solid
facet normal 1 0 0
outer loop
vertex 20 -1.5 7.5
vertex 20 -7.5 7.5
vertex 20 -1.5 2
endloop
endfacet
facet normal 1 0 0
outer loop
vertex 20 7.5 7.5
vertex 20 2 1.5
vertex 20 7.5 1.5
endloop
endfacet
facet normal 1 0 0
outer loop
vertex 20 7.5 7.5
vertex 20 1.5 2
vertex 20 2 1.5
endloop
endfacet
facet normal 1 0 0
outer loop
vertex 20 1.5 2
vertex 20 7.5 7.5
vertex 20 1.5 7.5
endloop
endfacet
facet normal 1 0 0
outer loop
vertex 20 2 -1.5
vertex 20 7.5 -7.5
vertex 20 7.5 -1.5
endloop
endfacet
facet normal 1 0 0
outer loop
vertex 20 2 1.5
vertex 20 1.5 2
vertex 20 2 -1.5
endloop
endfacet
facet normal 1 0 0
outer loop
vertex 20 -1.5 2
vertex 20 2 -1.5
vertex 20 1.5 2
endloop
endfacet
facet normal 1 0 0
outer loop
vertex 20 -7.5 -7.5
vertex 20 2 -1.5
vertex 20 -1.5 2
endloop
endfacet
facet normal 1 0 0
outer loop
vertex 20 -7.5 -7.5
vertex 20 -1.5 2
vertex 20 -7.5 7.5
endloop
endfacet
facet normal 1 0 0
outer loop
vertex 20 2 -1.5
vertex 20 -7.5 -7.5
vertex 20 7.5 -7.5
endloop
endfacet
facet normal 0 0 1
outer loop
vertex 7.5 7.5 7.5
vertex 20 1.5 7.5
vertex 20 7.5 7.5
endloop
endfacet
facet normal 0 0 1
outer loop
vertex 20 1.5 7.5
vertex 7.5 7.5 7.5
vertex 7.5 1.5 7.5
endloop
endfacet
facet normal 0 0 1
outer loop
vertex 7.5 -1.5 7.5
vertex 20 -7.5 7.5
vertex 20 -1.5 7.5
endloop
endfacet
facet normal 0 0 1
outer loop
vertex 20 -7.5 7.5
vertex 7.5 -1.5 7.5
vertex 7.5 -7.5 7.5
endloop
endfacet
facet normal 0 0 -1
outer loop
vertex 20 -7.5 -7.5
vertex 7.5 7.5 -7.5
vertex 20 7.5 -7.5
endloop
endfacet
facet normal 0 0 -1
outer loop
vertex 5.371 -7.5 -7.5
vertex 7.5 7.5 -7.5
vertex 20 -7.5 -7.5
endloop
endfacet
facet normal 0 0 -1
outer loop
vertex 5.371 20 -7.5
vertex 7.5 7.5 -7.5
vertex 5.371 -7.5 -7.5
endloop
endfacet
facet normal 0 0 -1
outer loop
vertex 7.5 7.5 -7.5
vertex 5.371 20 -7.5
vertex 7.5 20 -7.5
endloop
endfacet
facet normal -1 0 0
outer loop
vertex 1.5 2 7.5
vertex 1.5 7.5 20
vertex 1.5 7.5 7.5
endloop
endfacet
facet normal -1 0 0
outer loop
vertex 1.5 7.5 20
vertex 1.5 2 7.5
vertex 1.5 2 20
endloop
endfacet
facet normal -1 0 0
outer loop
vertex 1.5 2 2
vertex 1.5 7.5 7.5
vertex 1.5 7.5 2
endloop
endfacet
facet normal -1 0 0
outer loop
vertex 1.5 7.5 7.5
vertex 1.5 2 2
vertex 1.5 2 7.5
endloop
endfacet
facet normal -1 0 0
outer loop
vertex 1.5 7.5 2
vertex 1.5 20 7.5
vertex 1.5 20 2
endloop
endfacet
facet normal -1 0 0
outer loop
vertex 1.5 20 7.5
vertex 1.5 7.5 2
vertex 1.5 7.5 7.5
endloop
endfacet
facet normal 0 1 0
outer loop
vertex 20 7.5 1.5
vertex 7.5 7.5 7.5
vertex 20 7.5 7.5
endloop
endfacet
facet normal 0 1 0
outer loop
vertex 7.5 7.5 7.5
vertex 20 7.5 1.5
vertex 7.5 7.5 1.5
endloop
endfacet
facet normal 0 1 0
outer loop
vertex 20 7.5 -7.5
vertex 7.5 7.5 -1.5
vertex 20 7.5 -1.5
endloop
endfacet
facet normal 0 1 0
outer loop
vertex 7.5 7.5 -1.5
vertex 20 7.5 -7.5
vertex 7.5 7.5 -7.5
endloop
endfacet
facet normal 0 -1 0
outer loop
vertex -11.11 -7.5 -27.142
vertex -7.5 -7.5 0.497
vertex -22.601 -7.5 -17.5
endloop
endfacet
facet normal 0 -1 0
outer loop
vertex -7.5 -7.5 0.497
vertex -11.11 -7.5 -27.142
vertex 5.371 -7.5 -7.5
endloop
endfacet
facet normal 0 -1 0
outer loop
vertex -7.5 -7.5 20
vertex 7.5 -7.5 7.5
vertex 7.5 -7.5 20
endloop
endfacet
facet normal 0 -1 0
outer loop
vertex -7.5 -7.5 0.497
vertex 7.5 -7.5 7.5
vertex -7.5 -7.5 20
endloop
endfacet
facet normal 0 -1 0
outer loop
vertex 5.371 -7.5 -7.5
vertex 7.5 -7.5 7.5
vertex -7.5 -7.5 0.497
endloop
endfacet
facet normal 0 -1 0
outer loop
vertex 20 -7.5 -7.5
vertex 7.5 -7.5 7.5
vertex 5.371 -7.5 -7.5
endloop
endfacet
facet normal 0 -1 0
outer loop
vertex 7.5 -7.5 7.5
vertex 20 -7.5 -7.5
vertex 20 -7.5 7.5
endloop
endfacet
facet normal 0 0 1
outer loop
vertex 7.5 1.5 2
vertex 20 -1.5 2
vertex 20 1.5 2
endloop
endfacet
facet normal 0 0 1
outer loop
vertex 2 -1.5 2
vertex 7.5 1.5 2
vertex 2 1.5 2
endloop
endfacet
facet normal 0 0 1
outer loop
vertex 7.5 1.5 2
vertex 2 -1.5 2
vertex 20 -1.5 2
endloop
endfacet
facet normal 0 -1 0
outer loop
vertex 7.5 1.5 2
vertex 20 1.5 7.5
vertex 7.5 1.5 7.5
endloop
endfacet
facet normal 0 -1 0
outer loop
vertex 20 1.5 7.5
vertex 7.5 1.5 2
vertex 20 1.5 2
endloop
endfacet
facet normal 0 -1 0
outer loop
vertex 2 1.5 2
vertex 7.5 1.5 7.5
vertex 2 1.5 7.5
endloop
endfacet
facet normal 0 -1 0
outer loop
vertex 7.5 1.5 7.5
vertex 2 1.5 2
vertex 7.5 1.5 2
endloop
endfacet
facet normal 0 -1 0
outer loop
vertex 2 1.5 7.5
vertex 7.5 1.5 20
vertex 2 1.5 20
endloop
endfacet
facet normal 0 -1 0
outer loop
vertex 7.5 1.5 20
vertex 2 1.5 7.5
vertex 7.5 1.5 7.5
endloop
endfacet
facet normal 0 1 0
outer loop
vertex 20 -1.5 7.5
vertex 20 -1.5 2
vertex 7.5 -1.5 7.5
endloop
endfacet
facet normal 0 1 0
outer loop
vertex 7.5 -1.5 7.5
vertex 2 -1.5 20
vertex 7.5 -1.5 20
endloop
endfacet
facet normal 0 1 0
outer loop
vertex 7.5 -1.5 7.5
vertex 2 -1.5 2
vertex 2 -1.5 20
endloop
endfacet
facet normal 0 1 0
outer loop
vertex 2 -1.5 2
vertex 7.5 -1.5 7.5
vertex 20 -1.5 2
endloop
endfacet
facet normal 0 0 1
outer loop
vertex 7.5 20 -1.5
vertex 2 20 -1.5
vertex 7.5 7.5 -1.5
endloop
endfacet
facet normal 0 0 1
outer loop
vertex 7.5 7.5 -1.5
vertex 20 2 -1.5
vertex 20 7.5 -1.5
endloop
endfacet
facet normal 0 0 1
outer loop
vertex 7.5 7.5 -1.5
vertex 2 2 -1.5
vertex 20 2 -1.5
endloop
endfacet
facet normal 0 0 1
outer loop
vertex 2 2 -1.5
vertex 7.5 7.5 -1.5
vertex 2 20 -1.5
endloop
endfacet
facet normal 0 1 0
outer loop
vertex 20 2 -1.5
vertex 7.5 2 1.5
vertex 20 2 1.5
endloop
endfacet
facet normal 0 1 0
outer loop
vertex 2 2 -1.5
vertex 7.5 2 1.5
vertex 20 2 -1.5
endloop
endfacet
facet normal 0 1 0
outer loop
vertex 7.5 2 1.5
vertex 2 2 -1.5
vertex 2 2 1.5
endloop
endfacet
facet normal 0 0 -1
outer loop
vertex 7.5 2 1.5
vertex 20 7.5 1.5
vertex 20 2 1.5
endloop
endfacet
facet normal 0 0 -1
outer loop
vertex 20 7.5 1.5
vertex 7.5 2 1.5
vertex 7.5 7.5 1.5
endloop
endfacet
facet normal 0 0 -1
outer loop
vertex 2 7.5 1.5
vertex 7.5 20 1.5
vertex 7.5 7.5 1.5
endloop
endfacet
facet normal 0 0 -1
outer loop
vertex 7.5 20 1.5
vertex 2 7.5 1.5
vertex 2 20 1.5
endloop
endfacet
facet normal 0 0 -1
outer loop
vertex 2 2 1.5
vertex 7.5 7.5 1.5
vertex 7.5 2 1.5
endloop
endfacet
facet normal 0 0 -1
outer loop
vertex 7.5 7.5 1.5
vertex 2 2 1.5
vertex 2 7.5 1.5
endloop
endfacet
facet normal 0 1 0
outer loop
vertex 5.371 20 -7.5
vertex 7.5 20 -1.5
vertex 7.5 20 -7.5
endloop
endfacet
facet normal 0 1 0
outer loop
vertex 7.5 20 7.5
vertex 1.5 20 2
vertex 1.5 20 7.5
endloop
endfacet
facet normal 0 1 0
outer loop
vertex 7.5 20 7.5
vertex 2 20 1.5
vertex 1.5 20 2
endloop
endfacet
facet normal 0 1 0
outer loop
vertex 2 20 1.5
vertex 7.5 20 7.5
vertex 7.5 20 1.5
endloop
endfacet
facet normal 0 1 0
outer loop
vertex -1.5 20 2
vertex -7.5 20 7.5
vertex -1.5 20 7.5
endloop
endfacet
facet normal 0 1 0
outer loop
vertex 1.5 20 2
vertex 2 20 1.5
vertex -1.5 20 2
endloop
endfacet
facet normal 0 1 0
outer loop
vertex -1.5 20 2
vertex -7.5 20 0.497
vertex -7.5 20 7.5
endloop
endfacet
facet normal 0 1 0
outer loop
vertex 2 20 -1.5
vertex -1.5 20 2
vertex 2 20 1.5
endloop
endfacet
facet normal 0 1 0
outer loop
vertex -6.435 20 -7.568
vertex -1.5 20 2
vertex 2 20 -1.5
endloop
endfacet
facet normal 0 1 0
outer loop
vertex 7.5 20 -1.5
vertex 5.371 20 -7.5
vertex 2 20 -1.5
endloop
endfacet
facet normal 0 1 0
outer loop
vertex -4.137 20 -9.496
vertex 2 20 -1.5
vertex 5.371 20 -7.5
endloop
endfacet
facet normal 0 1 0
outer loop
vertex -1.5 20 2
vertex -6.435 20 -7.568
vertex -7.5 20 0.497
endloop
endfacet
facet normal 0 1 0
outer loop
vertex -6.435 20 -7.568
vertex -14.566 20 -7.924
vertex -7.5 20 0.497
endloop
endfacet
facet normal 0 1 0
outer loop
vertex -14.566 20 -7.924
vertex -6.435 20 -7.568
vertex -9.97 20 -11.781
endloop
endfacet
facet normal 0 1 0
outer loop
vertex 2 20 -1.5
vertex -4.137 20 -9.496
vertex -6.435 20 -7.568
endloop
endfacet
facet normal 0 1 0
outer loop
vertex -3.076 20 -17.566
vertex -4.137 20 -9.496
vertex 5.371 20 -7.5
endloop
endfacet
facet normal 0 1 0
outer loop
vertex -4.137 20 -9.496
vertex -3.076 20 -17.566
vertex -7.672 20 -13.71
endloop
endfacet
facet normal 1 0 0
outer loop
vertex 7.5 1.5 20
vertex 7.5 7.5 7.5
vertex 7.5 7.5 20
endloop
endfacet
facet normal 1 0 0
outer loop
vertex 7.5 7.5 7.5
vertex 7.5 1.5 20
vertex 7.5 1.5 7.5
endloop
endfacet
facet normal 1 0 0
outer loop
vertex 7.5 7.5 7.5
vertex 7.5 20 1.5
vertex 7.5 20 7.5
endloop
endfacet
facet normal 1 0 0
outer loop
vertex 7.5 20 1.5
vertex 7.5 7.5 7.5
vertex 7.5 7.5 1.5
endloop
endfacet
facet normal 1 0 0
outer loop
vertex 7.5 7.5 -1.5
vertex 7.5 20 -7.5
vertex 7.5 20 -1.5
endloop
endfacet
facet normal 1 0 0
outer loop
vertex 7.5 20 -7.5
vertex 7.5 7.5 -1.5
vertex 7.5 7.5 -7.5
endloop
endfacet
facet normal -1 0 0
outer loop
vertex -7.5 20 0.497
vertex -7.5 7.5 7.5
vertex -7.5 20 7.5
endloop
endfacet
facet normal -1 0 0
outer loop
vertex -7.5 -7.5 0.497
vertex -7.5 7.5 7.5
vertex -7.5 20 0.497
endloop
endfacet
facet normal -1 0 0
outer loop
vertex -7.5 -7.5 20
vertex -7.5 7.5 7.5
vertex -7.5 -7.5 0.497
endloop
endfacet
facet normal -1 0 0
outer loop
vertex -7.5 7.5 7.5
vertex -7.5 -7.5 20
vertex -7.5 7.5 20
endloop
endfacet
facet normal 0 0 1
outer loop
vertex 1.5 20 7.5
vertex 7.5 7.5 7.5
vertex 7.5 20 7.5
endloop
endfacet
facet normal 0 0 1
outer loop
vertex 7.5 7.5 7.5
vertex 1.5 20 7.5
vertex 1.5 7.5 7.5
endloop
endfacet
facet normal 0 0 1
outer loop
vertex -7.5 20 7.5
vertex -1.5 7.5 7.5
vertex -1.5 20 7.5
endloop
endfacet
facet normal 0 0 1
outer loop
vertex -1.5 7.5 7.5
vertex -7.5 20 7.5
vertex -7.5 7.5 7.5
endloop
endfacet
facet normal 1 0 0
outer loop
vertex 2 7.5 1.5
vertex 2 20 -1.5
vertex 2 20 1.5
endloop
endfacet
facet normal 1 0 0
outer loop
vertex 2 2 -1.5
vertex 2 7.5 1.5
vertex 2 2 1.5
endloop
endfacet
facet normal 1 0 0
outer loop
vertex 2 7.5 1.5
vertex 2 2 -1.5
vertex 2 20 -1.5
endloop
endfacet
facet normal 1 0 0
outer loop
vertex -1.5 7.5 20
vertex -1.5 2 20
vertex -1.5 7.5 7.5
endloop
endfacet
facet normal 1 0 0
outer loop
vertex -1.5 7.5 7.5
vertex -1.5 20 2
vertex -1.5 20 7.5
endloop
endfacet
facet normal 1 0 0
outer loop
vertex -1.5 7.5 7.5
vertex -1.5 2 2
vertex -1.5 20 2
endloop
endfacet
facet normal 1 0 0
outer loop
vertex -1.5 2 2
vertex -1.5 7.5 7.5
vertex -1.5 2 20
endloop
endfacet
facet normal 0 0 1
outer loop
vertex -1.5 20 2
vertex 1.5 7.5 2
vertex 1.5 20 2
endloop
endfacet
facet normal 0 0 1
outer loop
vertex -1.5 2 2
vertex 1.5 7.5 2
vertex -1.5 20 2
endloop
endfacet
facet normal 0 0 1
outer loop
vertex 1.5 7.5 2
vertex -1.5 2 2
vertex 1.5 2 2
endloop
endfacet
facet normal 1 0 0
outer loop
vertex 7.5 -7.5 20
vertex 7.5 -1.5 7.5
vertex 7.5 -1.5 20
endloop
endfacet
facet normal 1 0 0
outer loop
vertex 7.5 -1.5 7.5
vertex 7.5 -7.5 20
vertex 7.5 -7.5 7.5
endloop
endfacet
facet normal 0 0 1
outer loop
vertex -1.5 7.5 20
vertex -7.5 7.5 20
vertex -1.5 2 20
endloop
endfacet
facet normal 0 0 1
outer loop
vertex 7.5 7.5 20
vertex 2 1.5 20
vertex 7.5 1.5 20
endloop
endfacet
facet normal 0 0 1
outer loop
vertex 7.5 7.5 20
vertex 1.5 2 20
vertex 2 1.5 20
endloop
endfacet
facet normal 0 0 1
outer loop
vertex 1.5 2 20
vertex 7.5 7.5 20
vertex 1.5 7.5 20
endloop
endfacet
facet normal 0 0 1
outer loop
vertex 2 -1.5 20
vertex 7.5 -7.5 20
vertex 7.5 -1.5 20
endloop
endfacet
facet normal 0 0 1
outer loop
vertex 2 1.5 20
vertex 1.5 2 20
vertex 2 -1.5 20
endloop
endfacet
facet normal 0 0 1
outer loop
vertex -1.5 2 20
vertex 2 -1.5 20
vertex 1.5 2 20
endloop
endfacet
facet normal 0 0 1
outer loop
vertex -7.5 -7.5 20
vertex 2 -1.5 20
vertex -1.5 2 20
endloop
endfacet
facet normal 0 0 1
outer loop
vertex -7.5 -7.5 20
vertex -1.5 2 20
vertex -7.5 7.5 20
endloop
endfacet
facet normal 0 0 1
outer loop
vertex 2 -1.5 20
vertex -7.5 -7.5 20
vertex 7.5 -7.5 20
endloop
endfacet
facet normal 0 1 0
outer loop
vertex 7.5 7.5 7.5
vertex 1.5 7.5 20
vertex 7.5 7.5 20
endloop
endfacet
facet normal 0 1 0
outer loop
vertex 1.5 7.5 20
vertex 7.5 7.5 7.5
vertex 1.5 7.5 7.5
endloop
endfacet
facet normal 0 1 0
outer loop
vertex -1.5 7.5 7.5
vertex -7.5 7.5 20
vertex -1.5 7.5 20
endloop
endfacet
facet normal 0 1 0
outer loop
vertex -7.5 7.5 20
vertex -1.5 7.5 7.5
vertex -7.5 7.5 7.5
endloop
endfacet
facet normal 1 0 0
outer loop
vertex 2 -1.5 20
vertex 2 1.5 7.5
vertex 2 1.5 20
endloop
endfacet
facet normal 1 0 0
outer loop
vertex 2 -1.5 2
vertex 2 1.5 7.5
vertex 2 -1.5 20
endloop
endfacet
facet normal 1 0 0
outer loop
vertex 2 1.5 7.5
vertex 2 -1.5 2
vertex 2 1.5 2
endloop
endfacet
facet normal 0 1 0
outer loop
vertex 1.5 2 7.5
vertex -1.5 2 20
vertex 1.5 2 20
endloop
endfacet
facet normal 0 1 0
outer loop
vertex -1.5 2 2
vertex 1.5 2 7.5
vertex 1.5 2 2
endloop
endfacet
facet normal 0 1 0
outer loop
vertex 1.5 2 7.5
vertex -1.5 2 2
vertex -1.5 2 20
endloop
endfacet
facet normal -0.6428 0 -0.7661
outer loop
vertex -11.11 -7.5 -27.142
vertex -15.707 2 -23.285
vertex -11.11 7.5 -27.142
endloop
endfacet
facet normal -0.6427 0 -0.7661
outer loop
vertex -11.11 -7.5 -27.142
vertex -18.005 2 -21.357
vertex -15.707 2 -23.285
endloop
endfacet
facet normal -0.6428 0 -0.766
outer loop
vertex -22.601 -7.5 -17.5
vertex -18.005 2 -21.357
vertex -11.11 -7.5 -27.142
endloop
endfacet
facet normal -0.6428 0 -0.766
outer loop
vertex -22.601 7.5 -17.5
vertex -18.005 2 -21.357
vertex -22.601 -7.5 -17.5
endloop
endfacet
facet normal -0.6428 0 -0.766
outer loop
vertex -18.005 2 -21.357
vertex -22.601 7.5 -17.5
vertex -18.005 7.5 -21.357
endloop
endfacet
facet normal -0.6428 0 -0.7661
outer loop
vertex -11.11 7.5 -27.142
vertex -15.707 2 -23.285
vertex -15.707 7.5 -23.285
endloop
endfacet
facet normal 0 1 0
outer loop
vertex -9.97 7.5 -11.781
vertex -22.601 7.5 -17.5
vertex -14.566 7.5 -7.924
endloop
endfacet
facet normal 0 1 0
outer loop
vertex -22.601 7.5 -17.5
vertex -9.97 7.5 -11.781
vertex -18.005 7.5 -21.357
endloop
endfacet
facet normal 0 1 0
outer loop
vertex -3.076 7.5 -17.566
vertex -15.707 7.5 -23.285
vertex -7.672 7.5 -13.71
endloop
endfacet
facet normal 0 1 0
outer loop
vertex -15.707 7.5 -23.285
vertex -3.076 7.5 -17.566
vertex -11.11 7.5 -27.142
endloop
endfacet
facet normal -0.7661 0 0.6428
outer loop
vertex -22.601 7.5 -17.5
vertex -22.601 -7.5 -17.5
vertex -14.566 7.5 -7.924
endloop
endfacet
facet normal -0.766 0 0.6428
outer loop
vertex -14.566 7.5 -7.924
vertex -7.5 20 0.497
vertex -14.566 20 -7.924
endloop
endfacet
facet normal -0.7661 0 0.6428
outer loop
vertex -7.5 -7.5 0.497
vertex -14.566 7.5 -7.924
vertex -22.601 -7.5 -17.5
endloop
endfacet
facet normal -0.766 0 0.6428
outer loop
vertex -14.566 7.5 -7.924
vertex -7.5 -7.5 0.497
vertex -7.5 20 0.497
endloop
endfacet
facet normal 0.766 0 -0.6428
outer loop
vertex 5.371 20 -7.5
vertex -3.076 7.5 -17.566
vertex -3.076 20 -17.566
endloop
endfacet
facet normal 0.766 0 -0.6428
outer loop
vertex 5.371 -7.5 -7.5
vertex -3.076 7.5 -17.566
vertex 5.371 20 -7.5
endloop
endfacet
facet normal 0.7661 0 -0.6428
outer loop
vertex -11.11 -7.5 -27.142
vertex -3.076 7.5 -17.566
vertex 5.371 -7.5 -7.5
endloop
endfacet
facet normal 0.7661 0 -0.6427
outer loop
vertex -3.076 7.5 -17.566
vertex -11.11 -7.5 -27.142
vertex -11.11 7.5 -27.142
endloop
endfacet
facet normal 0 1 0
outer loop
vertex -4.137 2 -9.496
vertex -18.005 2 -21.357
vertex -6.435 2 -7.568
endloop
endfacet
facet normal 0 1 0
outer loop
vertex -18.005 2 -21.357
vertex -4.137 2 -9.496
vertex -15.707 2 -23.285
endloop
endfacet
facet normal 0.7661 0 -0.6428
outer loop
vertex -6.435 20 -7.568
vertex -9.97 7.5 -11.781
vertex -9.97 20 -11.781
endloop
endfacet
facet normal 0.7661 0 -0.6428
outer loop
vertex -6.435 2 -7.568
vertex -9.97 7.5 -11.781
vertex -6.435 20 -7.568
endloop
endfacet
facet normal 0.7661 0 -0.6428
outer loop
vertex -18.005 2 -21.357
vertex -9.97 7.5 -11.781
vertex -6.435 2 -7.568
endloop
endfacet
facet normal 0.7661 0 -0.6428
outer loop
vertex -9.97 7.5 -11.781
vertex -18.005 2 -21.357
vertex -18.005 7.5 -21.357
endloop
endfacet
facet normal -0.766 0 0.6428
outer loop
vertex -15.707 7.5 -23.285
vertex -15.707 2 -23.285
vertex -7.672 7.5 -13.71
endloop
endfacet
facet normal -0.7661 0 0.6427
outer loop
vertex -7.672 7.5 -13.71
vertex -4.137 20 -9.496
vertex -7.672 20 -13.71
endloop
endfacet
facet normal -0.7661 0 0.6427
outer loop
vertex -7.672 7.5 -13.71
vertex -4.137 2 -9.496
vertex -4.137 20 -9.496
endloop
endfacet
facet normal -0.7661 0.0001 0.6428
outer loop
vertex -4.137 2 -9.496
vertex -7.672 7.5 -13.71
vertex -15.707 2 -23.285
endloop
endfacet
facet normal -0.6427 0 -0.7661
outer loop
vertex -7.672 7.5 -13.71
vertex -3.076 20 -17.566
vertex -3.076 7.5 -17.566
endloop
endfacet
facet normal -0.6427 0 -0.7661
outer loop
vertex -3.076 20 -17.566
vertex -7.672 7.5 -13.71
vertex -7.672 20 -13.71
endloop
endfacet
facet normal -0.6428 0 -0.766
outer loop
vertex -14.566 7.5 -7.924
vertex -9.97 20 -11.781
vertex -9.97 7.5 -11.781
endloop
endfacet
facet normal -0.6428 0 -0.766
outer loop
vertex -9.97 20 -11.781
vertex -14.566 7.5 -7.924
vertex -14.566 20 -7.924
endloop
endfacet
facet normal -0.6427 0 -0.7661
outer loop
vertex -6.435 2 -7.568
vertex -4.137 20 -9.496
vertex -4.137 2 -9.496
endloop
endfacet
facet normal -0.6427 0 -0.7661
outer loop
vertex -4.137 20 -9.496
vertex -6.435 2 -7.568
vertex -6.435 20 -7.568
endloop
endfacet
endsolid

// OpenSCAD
union()
{
  union()
  {
    translate(v = [10.75, 0, 0])
    {
      difference()
      {
        difference()
        {
          cube(size = [18.5, 15, 15], center = true);
          translate(v = [0, 0, 5.5])
          {
            cube(size = [19.5, 3, 7], center = true);
          }
        }
        rotate(a = [-90, 0, 0], v = undef)
        {
          translate(v = [0, 0, 5.5])
          {
            cube(size = [19.5, 3, 7], center = true);
          }
        }
      }
    }
    translate(v = [0, 10.75, 0])
    {
      rotate(a = [90, 0, 90], v = undef)
      {
        difference()
        {
          difference()
          {
            cube(size = [18.5, 15, 15], center = true);
            translate(v = [0, 0, 5.5])
            {
              cube(size = [19.5, 3, 7], center = true);
            }
          }
          rotate(a = [-90, 0, 0], v = undef)
          {
            translate(v = [0, 0, 5.5])
            {
              cube(size = [19.5, 3, 7], center = true);
            }
          }
        }
      }
    }
    translate(v = [-2.95, -2.95, 0])
    {
      cube(size = [9.1, 9.1, 15], center = true);
    }
    translate(v = [0, 0, 10.75])
    {
      rotate(a = [0, 90, 0], v = undef)
      {
        difference()
        {
          difference()
          {
            cube(size = [18.5, 15, 15], center = true);
            translate(v = [0, 0, 5.5])
            {
              cube(size = [19.5, 3, 7], center = true);
            }
          }
          rotate(a = [-90, 0, 0], v = undef)
          {
            translate(v = [0, 0, 5.5])
            {
              cube(size = [19.5, 3, 7], center = true);
            }
          }
        }
      }
    }
  }
  translate(v = [-4, 0, -7])
  {
    rotate(a = [0, 130, 0], v = undef)
    {
      union()
      {
        rotate(a = [-90, 0, 0], v = undef)
        {
          translate(v = [10.75, 0, 0])
          {
            difference()
            {
              cube(size = [18.5, 15, 15], center = true);
              translate(v = [0, 0, 5.5])
              {
                cube(size = [19.5, 3, 7], center = true);
              }
            }
          }
        }
        rotate(a = [0, 90, 0], v = undef)
        {
          translate(v = [0, 10.75, 0])
          {
            rotate(a = [0, 0, 90], v = undef)
            {
              difference()
              {
                cube(size = [18.5, 15, 15], center = true);
                translate(v = [0, 0, 5.5])
                {
                  cube(size = [19.5, 3, 7], center = true);
                }
              }
            }
          }
        }
        translate(v = [-2.95, -2.95, 0])
        {
          cube(size = [9.1, 9.1, 15], center = true);
        }
      }
    }
  }
}
